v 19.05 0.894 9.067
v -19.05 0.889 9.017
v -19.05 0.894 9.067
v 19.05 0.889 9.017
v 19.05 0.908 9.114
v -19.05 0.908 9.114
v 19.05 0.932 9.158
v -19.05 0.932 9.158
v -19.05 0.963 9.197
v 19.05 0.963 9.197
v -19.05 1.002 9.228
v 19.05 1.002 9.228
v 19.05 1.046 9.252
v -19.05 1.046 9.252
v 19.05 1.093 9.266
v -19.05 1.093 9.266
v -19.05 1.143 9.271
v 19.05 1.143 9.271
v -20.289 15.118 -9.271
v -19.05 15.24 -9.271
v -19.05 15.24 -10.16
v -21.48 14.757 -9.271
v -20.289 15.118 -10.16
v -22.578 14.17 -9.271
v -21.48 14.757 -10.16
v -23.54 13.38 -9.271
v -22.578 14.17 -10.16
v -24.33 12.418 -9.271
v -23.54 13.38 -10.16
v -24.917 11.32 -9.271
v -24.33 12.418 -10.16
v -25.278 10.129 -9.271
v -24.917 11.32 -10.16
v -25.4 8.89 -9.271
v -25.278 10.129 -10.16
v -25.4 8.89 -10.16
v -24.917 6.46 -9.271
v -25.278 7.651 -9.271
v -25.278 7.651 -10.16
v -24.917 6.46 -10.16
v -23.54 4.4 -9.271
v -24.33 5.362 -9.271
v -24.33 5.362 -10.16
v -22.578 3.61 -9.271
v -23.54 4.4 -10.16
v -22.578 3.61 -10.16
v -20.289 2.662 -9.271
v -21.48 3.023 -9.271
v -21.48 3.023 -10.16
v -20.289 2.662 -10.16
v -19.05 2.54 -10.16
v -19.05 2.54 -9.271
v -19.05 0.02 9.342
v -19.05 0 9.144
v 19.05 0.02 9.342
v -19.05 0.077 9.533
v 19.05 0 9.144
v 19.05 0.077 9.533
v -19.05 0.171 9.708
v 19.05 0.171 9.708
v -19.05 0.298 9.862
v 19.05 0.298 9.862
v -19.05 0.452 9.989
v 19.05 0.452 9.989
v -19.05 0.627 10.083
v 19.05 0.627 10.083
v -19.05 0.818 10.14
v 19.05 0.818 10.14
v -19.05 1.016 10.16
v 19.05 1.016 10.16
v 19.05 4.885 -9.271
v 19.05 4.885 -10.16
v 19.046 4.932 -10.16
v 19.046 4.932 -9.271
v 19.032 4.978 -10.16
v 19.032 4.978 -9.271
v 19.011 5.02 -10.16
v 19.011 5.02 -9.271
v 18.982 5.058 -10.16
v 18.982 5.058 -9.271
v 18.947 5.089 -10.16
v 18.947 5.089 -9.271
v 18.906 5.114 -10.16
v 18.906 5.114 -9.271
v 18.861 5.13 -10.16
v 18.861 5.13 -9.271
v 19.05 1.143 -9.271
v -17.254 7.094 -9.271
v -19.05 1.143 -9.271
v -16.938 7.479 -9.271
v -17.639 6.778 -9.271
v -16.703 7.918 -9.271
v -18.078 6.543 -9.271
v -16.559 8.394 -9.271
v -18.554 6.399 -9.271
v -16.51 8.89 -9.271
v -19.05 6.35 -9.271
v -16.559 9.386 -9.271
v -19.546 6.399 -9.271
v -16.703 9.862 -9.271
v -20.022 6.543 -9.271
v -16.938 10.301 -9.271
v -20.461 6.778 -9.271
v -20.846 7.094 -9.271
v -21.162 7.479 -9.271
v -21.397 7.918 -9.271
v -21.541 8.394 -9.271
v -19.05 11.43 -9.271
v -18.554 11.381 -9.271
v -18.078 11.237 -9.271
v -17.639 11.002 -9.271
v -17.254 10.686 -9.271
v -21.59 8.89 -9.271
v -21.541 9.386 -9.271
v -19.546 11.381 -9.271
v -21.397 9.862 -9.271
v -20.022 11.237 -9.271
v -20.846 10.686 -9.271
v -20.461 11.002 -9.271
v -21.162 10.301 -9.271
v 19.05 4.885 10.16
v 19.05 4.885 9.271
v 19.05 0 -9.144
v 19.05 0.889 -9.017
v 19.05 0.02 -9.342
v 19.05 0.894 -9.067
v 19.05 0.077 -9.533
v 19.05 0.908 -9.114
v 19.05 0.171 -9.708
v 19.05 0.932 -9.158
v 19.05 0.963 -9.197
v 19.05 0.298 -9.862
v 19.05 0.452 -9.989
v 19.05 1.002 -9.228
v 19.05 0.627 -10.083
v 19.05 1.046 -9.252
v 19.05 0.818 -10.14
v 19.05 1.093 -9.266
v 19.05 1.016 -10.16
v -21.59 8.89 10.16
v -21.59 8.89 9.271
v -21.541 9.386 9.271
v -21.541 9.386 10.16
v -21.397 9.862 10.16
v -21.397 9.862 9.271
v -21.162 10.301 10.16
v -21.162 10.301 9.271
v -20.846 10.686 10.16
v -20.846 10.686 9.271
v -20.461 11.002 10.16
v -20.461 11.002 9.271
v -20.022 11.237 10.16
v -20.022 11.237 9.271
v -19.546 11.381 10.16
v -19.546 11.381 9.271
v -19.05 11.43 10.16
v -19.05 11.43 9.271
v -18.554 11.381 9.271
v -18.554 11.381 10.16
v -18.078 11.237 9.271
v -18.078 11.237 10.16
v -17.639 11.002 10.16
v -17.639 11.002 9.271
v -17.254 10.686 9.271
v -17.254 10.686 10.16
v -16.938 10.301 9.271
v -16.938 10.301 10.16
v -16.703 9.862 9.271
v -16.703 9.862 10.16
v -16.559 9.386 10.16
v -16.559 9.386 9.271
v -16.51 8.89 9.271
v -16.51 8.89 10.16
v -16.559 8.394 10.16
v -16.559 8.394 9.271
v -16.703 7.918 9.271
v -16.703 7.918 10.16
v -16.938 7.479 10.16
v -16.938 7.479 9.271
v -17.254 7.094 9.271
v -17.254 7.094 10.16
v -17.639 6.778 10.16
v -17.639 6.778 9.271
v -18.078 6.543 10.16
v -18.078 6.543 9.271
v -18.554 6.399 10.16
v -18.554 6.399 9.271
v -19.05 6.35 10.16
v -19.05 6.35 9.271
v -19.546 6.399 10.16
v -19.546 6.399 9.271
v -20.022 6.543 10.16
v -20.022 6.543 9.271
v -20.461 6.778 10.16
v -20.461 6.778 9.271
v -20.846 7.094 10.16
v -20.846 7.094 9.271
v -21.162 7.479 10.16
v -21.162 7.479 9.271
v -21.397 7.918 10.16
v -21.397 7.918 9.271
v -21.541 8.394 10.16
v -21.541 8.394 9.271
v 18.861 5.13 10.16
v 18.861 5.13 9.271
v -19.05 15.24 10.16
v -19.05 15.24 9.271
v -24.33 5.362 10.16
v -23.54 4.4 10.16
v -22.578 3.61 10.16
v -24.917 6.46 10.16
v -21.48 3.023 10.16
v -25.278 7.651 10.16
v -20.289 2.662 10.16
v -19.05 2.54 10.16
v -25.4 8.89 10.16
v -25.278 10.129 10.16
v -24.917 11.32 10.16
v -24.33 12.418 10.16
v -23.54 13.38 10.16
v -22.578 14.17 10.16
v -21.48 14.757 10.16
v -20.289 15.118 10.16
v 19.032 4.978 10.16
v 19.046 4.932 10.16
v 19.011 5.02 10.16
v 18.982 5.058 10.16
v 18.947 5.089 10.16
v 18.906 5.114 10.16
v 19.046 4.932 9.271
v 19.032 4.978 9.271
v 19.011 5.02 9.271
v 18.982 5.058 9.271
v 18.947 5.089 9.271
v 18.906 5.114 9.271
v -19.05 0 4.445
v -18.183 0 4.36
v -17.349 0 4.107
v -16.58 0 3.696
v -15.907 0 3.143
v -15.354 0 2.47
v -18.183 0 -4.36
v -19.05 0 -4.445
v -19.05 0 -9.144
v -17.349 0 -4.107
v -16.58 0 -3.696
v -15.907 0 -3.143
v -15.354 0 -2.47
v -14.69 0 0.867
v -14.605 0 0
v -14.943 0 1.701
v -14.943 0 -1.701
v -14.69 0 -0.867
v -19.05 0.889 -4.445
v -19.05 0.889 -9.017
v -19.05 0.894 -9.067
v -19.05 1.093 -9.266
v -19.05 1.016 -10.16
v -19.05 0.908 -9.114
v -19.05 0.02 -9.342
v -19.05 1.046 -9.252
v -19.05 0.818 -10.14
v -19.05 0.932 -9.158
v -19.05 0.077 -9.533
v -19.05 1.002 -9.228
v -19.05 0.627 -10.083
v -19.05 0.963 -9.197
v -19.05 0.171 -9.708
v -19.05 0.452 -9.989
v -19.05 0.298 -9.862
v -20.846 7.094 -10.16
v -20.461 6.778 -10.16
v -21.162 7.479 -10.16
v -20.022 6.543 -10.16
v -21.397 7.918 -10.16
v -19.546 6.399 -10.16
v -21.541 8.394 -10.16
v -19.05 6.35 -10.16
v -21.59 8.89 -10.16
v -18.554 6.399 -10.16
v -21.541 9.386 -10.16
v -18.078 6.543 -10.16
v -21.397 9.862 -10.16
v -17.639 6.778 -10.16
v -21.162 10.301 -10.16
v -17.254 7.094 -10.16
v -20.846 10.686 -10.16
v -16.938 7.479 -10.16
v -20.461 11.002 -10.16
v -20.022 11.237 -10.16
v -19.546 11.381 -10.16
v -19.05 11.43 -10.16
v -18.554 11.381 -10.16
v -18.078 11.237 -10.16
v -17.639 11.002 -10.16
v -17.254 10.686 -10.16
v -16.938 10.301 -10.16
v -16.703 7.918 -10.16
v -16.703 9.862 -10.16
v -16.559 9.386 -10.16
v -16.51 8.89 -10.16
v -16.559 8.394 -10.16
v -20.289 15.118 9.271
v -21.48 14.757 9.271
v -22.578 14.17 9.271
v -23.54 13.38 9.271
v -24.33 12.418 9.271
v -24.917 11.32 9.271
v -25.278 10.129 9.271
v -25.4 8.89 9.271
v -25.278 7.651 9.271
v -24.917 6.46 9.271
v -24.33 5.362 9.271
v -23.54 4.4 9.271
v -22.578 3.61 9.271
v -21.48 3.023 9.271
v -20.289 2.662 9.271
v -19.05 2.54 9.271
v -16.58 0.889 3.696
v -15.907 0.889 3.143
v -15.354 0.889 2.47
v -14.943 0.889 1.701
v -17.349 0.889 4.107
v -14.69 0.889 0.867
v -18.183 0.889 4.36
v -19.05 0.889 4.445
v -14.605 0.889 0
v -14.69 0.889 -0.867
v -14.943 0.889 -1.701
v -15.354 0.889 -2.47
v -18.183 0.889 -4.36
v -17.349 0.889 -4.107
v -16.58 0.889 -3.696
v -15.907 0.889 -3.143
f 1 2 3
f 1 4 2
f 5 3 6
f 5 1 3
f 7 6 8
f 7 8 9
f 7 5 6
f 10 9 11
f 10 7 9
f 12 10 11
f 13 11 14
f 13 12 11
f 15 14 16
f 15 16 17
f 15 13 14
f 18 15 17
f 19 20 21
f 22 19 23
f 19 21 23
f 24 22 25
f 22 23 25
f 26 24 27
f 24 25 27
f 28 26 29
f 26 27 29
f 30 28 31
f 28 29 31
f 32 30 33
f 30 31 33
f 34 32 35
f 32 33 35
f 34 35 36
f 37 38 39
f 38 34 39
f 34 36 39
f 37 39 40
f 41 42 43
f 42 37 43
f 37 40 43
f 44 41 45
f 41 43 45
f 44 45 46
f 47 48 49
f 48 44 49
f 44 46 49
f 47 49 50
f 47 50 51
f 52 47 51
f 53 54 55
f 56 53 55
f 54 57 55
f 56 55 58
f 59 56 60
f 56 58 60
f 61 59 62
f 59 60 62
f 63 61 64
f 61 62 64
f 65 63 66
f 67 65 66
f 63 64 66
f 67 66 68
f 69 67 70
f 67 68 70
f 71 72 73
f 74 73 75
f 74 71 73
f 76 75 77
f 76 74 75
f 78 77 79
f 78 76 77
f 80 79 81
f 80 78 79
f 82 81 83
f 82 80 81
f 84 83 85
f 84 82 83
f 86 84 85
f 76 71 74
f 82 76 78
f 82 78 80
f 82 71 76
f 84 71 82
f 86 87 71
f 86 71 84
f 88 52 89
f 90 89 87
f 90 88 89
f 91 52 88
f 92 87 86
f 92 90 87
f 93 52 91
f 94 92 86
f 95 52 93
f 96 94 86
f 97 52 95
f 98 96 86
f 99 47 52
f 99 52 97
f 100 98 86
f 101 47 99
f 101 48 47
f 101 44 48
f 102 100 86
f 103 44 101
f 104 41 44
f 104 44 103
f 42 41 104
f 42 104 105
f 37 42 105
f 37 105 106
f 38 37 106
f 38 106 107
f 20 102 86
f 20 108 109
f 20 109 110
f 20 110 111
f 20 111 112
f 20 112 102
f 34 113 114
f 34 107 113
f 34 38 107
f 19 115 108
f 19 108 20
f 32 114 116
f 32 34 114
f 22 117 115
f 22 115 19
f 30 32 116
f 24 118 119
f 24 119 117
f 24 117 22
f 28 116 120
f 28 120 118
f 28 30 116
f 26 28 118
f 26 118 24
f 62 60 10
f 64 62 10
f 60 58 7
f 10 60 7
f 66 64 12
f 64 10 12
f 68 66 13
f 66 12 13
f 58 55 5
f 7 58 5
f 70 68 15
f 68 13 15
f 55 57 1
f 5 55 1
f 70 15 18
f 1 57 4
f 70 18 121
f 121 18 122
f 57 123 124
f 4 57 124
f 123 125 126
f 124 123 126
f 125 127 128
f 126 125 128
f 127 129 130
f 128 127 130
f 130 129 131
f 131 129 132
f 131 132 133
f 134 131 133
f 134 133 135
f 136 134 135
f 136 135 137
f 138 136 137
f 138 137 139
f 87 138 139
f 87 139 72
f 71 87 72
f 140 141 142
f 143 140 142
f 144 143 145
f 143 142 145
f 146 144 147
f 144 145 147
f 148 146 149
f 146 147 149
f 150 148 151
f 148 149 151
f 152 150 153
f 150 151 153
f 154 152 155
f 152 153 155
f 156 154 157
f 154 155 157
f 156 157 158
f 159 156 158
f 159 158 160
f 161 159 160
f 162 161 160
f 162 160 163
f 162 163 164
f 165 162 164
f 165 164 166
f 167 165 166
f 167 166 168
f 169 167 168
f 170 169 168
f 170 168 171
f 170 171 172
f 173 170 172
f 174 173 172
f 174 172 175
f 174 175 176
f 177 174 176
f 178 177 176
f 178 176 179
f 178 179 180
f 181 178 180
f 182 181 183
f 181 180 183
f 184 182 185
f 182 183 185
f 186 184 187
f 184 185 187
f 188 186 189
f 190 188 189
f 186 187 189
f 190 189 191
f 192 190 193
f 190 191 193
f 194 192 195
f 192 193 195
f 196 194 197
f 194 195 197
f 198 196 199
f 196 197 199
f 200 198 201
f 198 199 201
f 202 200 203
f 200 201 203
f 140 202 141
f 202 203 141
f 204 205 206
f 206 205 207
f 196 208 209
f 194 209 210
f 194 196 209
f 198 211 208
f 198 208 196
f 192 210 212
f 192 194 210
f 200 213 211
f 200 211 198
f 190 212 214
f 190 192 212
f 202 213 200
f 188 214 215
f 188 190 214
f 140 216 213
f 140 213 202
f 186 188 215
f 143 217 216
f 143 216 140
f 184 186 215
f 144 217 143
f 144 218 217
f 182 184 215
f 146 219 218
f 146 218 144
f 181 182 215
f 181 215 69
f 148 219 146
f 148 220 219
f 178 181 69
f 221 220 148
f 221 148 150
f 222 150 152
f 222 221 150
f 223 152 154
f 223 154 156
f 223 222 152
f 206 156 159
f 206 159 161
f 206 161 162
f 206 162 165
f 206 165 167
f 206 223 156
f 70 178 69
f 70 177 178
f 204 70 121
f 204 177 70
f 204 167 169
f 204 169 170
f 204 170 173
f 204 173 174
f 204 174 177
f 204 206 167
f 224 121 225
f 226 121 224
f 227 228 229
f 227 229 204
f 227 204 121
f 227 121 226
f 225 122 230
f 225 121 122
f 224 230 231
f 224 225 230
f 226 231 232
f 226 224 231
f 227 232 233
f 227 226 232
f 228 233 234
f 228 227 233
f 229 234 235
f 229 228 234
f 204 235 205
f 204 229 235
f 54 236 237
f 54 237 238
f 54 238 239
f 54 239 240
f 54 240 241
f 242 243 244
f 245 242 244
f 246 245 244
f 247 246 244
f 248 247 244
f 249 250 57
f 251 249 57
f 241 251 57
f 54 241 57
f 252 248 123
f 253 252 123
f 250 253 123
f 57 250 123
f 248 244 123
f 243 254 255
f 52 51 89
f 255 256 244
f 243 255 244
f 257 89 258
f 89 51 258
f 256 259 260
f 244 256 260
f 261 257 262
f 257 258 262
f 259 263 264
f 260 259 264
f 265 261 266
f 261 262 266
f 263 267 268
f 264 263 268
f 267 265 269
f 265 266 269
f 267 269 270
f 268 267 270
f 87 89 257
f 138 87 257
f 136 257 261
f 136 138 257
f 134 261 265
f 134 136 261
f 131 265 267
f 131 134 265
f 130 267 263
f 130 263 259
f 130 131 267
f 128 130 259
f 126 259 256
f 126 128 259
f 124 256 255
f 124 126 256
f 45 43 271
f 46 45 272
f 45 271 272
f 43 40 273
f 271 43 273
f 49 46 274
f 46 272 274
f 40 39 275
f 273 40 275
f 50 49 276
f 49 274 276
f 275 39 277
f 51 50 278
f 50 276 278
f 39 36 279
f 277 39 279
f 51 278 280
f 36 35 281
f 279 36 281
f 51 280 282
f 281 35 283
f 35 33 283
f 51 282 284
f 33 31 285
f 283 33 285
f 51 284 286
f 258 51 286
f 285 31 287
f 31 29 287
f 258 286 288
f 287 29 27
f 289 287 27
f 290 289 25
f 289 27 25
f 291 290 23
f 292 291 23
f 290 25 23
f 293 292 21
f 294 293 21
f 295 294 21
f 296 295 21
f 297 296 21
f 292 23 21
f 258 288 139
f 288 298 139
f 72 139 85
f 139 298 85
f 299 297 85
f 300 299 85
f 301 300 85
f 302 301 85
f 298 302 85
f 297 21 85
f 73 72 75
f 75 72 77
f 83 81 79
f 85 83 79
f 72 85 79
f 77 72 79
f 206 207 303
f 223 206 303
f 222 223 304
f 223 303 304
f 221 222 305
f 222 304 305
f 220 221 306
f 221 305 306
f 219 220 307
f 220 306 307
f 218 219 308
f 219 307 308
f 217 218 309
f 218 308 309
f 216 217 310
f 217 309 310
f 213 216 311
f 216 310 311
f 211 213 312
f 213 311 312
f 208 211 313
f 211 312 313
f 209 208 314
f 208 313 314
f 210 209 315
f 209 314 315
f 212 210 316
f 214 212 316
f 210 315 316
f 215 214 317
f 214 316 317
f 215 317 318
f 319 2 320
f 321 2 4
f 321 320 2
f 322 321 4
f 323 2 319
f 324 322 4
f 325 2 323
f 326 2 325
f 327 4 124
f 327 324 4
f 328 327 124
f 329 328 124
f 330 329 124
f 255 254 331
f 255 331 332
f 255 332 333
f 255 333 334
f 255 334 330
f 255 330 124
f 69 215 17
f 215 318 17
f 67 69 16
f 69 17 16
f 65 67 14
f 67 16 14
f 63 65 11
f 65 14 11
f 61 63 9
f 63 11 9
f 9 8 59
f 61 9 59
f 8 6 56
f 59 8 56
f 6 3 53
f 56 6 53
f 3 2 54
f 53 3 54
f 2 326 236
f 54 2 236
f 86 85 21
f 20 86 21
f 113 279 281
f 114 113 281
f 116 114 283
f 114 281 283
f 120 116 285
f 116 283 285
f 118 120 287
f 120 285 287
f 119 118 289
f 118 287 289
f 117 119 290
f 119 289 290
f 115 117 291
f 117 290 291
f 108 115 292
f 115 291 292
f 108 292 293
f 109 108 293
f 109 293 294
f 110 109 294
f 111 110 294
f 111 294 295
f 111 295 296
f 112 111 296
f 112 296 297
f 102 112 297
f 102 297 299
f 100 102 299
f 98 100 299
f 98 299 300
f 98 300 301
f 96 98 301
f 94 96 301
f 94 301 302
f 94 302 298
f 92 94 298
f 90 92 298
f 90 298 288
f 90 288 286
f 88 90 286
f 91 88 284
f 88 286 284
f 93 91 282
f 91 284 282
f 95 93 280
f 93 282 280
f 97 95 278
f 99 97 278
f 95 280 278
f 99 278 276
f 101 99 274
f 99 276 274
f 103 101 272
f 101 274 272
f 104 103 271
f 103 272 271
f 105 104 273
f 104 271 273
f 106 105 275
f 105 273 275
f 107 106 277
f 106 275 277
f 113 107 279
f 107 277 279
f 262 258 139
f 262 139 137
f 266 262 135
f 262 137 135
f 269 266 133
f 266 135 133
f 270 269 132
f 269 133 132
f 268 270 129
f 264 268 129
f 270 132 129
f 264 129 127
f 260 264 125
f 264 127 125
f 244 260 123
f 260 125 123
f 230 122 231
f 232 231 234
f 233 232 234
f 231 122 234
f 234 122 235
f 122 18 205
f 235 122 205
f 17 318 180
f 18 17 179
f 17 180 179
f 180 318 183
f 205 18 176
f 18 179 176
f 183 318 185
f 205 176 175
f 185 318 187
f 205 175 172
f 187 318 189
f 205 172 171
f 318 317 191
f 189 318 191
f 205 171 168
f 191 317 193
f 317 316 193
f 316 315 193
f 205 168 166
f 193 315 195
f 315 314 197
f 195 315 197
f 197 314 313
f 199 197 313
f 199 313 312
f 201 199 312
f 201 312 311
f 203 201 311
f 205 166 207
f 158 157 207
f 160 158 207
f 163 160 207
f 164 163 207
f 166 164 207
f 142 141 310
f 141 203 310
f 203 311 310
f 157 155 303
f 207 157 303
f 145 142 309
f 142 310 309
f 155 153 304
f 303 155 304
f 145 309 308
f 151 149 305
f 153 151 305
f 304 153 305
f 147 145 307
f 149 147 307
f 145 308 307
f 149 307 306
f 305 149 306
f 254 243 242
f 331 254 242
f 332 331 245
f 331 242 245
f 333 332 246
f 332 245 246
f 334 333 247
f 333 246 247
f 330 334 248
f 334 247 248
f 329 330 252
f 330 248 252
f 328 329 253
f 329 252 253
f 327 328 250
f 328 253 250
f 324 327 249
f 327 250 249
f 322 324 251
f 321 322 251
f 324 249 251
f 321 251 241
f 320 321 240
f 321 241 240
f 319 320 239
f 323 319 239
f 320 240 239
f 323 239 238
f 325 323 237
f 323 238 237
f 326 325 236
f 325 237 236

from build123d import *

# Parameters (mm, degrees)
EXTRUDED_BOSS_FRONT_PLANE_WING_DEPTH      = 10.16
EXTRUDED_BOSS_FRONT_PLANE_WING_DEPTH_BACK = 10.16
EXTRUDED_CUT_RIGHT_PLANE_WING_DEPTH       = 32.315223135
EXTRUDED_CUT_RIGHT_PLANE_WING_DEPTH_BACK  = 32.315223135
SKETCH3_W                                 = 18.542
SKETCH3_H                                 = 14.351
F_2X_0_2D_HOLES_D                         = 5.08
F_0_35D_HOLE_D                            = 8.89
INNER_CONNECTING_FILLET_R                 = 0.254
OUTTER_CONNECTING_FILLET_R                = 1.016


with BuildPart() as part:
    # Sketch2 → Extruded Boss Front Plane Wing (new, two sides: drawn at the far end of the back side and taken through both)
    with BuildSketch(Plane.XY.offset(-EXTRUDED_BOSS_FRONT_PLANE_WING_DEPTH_BACK)):
        with BuildLine():
            Line((-19.05, 0), (19.05, 0))
            Line((19.05, 0), (19.05, 5.08))
            Line((19.05, 5.08), (-19.05, 15.24))
            ThreePointArc((-19.05, 15.24), (-25.4, 8.89), (-19.05, 2.54))
            Line((-19.05, 2.54), (-19.05, 0))
        make_face()
    extrude(amount=EXTRUDED_BOSS_FRONT_PLANE_WING_DEPTH + EXTRUDED_BOSS_FRONT_PLANE_WING_DEPTH_BACK)

    # Sketch3 → Extruded Cut Right Plane Wing (cut, two sides: drawn at the far end of the back side and taken through both)
    with BuildSketch(Plane(origin=(0, 0, 0), x_dir=(0, 0, -1), z_dir=(1, 0, 0)).offset(-EXTRUDED_CUT_RIGHT_PLANE_WING_DEPTH_BACK)):
        with Locations((0, 8.0645)):
            Rectangle(SKETCH3_W, SKETCH3_H)
    extrude(amount=EXTRUDED_CUT_RIGHT_PLANE_WING_DEPTH + EXTRUDED_CUT_RIGHT_PLANE_WING_DEPTH_BACK, mode=Mode.SUBTRACT)

    # 2X 0.2D Holes (through all)
    with Locations(Plane.XY.offset(10.16)):
        with Locations((-19.05, 8.89)):
            Hole(F_2X_0_2D_HOLES_D / 2)

    # 0.35D Hole (through all)
    with Locations(Plane(origin=(0, 0.889, 0), x_dir=(1, 0, 0), z_dir=(0, 1, 0))):
        with Locations((-19.05, 0)):
            Hole(F_0_35D_HOLE_D / 2)

    # Inner Connecting Fillet
    inner_connecting_fillet_edges = [part.edges().sort_by_distance(p)[0] for p in [
        (19.05, 5.08, 9.7155),
        (0, 0.889, -9.271),
        (0, 0.889, 9.271),
        (19.05, 5.08, -9.7155),
    ]]
    fillet(inner_connecting_fillet_edges, radius=INNER_CONNECTING_FILLET_R)

    # Outter Connecting Fillet
    outter_connecting_fillet_edges = [part.edges().sort_by_distance(p)[0] for p in [
        (0, 0, 10.16),
        (0, 0, -10.16),
    ]]
    fillet(outter_connecting_fillet_edges, radius=OUTTER_CONNECTING_FILLET_R)


solid = part.part
